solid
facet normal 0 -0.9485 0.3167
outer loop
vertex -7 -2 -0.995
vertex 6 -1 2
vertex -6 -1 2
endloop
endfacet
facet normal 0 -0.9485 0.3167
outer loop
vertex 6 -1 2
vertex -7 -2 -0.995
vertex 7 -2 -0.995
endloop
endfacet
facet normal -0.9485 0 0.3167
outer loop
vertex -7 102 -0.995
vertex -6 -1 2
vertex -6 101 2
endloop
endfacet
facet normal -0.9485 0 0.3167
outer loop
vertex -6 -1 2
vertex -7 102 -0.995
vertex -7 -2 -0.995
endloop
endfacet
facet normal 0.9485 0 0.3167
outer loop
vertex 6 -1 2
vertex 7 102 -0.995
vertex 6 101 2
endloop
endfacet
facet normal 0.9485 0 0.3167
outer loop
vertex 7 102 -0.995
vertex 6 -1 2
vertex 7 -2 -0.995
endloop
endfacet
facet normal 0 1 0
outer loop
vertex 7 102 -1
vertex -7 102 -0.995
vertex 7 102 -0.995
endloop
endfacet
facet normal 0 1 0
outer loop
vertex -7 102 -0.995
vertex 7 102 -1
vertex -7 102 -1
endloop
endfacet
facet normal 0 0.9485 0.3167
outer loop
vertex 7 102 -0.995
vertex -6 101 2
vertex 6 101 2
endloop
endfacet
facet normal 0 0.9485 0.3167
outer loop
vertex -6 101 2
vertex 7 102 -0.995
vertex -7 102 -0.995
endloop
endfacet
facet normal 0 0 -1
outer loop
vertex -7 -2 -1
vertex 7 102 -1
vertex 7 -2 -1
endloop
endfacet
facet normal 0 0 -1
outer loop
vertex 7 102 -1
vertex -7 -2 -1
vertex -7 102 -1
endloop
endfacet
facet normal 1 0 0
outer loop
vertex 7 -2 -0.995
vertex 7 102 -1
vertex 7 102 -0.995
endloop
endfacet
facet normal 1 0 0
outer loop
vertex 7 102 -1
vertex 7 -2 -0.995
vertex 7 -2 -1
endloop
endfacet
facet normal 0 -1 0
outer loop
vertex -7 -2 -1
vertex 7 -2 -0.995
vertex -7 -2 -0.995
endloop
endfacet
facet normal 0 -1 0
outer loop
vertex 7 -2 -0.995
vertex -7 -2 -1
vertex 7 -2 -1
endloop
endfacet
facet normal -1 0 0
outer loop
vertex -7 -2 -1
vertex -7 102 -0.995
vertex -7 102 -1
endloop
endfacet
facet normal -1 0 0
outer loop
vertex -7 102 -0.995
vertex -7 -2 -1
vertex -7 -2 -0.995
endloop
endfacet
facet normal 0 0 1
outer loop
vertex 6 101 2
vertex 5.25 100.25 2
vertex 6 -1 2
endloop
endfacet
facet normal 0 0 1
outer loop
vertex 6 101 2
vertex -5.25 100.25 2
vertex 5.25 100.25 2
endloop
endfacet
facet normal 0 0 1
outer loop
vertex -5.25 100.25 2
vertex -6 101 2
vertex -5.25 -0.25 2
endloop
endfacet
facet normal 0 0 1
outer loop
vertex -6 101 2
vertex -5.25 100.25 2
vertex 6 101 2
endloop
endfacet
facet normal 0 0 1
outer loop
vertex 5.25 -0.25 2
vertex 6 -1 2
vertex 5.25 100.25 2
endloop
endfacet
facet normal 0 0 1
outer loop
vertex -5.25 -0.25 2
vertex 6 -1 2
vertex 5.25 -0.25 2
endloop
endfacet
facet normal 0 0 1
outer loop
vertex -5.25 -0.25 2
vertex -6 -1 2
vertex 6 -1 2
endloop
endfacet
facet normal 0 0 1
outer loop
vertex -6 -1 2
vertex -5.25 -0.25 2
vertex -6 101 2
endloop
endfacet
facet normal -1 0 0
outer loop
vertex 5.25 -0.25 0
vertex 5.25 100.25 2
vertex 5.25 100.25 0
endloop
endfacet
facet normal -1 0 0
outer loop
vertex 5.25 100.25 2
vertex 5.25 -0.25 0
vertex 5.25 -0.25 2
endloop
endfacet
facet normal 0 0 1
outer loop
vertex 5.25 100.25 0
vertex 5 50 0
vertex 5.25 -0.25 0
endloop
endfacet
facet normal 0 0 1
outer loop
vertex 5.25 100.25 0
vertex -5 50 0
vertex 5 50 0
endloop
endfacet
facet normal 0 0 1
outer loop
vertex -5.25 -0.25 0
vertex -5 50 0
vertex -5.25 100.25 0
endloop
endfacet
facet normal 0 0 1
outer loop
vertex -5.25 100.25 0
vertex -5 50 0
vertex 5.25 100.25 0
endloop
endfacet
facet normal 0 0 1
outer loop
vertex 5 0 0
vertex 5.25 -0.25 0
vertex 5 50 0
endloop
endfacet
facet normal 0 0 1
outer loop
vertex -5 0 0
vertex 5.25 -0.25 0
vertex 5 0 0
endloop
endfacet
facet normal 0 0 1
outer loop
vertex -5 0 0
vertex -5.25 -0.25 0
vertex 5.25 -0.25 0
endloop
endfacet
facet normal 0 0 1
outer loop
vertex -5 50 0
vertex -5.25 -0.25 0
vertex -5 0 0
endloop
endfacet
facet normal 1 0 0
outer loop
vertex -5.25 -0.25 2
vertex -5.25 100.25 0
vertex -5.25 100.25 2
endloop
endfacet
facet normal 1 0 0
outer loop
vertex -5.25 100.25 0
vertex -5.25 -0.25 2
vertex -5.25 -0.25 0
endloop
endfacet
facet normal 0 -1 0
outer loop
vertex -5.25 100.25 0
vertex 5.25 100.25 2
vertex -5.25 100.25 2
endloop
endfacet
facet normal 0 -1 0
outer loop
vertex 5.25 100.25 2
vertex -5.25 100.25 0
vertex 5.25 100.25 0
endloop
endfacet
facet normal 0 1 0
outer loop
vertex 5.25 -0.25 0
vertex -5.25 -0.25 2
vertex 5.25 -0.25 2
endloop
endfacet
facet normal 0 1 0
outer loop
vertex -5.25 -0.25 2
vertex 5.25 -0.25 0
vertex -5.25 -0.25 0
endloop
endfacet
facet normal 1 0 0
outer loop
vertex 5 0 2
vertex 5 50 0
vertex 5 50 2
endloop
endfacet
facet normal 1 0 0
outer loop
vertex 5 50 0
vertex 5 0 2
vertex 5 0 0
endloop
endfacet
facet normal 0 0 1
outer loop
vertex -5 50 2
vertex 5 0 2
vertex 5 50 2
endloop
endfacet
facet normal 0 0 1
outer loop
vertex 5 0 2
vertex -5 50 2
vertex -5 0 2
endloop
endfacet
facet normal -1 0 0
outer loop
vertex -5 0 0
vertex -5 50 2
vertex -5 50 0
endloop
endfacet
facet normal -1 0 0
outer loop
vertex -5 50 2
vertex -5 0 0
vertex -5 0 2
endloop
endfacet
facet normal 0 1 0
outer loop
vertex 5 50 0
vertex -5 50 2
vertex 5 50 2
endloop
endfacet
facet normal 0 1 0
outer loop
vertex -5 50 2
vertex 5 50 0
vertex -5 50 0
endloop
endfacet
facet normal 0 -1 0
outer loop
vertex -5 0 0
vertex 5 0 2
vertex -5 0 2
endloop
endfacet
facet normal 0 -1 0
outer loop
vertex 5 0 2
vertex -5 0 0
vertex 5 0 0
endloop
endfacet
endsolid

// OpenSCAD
bar_length=100;
bar_width=10;
base_wall_t=1;
piece_thicness=2;
gap=.25;


base();
half();
module base(){
	difference(){
		hull(){
			translate([-bar_width/2-base_wall_t,-base_wall_t,-base_wall_t])cube([bar_width+2*base_wall_t,bar_length+2*base_wall_t,piece_thicness+base_wall_t]);
			translate([-bar_width/2-2*base_wall_t,-2*base_wall_t,-base_wall_t])cube([bar_width+4*base_wall_t,bar_length+4*base_wall_t,.005]);
		}
		translate([-bar_width/2-gap,-gap,0])cube([bar_width+2*gap,2*gap+bar_length,piece_thicness]);
	}
}

module half(){
	translate([-bar_width/2,0,0])cube([bar_width,bar_length/2,piece_thicness]);
}

module third(){
	translate([-bar_width/2,0,0])cube([bar_width,bar_length/3,piece_thicness]);
}

module quarter(){
	translate([-bar_width/2,0,0])cube([bar_width,bar_length/4,piece_thicness]);
}

module fifth(){
	translate([-bar_width/2,0,0])cube([bar_width,bar_length/5,piece_thicness]);
}

module sixth(){
	translate([-bar_width/2,0,0])cube([bar_width,bar_length/6,piece_thicness]);
}

module seventh(){
	translate([-bar_width/2,0,0])cube([bar_width,bar_length/7,piece_thicness]);
}

module eighth(){
	translate([-bar_width/2,0,0])cube([bar_width,bar_length/8,piece_thicness]);
}

module ninth(){
	translate([-bar_width/2,0,0])cube([bar_width,bar_length/9,piece_thicness]);
}

module tenth(){
	translate([-bar_width/2,0,0])cube([bar_width,bar_length/10,piece_thicness]);
}

module eleventh(){
	translate([-bar_width/2,0,0])cube([bar_width,bar_length/11,piece_thicness]);
}

module twelth(){
	translate([-bar_width/2,0,0])cube([bar_width,bar_length/12,piece_thicness]);
}
